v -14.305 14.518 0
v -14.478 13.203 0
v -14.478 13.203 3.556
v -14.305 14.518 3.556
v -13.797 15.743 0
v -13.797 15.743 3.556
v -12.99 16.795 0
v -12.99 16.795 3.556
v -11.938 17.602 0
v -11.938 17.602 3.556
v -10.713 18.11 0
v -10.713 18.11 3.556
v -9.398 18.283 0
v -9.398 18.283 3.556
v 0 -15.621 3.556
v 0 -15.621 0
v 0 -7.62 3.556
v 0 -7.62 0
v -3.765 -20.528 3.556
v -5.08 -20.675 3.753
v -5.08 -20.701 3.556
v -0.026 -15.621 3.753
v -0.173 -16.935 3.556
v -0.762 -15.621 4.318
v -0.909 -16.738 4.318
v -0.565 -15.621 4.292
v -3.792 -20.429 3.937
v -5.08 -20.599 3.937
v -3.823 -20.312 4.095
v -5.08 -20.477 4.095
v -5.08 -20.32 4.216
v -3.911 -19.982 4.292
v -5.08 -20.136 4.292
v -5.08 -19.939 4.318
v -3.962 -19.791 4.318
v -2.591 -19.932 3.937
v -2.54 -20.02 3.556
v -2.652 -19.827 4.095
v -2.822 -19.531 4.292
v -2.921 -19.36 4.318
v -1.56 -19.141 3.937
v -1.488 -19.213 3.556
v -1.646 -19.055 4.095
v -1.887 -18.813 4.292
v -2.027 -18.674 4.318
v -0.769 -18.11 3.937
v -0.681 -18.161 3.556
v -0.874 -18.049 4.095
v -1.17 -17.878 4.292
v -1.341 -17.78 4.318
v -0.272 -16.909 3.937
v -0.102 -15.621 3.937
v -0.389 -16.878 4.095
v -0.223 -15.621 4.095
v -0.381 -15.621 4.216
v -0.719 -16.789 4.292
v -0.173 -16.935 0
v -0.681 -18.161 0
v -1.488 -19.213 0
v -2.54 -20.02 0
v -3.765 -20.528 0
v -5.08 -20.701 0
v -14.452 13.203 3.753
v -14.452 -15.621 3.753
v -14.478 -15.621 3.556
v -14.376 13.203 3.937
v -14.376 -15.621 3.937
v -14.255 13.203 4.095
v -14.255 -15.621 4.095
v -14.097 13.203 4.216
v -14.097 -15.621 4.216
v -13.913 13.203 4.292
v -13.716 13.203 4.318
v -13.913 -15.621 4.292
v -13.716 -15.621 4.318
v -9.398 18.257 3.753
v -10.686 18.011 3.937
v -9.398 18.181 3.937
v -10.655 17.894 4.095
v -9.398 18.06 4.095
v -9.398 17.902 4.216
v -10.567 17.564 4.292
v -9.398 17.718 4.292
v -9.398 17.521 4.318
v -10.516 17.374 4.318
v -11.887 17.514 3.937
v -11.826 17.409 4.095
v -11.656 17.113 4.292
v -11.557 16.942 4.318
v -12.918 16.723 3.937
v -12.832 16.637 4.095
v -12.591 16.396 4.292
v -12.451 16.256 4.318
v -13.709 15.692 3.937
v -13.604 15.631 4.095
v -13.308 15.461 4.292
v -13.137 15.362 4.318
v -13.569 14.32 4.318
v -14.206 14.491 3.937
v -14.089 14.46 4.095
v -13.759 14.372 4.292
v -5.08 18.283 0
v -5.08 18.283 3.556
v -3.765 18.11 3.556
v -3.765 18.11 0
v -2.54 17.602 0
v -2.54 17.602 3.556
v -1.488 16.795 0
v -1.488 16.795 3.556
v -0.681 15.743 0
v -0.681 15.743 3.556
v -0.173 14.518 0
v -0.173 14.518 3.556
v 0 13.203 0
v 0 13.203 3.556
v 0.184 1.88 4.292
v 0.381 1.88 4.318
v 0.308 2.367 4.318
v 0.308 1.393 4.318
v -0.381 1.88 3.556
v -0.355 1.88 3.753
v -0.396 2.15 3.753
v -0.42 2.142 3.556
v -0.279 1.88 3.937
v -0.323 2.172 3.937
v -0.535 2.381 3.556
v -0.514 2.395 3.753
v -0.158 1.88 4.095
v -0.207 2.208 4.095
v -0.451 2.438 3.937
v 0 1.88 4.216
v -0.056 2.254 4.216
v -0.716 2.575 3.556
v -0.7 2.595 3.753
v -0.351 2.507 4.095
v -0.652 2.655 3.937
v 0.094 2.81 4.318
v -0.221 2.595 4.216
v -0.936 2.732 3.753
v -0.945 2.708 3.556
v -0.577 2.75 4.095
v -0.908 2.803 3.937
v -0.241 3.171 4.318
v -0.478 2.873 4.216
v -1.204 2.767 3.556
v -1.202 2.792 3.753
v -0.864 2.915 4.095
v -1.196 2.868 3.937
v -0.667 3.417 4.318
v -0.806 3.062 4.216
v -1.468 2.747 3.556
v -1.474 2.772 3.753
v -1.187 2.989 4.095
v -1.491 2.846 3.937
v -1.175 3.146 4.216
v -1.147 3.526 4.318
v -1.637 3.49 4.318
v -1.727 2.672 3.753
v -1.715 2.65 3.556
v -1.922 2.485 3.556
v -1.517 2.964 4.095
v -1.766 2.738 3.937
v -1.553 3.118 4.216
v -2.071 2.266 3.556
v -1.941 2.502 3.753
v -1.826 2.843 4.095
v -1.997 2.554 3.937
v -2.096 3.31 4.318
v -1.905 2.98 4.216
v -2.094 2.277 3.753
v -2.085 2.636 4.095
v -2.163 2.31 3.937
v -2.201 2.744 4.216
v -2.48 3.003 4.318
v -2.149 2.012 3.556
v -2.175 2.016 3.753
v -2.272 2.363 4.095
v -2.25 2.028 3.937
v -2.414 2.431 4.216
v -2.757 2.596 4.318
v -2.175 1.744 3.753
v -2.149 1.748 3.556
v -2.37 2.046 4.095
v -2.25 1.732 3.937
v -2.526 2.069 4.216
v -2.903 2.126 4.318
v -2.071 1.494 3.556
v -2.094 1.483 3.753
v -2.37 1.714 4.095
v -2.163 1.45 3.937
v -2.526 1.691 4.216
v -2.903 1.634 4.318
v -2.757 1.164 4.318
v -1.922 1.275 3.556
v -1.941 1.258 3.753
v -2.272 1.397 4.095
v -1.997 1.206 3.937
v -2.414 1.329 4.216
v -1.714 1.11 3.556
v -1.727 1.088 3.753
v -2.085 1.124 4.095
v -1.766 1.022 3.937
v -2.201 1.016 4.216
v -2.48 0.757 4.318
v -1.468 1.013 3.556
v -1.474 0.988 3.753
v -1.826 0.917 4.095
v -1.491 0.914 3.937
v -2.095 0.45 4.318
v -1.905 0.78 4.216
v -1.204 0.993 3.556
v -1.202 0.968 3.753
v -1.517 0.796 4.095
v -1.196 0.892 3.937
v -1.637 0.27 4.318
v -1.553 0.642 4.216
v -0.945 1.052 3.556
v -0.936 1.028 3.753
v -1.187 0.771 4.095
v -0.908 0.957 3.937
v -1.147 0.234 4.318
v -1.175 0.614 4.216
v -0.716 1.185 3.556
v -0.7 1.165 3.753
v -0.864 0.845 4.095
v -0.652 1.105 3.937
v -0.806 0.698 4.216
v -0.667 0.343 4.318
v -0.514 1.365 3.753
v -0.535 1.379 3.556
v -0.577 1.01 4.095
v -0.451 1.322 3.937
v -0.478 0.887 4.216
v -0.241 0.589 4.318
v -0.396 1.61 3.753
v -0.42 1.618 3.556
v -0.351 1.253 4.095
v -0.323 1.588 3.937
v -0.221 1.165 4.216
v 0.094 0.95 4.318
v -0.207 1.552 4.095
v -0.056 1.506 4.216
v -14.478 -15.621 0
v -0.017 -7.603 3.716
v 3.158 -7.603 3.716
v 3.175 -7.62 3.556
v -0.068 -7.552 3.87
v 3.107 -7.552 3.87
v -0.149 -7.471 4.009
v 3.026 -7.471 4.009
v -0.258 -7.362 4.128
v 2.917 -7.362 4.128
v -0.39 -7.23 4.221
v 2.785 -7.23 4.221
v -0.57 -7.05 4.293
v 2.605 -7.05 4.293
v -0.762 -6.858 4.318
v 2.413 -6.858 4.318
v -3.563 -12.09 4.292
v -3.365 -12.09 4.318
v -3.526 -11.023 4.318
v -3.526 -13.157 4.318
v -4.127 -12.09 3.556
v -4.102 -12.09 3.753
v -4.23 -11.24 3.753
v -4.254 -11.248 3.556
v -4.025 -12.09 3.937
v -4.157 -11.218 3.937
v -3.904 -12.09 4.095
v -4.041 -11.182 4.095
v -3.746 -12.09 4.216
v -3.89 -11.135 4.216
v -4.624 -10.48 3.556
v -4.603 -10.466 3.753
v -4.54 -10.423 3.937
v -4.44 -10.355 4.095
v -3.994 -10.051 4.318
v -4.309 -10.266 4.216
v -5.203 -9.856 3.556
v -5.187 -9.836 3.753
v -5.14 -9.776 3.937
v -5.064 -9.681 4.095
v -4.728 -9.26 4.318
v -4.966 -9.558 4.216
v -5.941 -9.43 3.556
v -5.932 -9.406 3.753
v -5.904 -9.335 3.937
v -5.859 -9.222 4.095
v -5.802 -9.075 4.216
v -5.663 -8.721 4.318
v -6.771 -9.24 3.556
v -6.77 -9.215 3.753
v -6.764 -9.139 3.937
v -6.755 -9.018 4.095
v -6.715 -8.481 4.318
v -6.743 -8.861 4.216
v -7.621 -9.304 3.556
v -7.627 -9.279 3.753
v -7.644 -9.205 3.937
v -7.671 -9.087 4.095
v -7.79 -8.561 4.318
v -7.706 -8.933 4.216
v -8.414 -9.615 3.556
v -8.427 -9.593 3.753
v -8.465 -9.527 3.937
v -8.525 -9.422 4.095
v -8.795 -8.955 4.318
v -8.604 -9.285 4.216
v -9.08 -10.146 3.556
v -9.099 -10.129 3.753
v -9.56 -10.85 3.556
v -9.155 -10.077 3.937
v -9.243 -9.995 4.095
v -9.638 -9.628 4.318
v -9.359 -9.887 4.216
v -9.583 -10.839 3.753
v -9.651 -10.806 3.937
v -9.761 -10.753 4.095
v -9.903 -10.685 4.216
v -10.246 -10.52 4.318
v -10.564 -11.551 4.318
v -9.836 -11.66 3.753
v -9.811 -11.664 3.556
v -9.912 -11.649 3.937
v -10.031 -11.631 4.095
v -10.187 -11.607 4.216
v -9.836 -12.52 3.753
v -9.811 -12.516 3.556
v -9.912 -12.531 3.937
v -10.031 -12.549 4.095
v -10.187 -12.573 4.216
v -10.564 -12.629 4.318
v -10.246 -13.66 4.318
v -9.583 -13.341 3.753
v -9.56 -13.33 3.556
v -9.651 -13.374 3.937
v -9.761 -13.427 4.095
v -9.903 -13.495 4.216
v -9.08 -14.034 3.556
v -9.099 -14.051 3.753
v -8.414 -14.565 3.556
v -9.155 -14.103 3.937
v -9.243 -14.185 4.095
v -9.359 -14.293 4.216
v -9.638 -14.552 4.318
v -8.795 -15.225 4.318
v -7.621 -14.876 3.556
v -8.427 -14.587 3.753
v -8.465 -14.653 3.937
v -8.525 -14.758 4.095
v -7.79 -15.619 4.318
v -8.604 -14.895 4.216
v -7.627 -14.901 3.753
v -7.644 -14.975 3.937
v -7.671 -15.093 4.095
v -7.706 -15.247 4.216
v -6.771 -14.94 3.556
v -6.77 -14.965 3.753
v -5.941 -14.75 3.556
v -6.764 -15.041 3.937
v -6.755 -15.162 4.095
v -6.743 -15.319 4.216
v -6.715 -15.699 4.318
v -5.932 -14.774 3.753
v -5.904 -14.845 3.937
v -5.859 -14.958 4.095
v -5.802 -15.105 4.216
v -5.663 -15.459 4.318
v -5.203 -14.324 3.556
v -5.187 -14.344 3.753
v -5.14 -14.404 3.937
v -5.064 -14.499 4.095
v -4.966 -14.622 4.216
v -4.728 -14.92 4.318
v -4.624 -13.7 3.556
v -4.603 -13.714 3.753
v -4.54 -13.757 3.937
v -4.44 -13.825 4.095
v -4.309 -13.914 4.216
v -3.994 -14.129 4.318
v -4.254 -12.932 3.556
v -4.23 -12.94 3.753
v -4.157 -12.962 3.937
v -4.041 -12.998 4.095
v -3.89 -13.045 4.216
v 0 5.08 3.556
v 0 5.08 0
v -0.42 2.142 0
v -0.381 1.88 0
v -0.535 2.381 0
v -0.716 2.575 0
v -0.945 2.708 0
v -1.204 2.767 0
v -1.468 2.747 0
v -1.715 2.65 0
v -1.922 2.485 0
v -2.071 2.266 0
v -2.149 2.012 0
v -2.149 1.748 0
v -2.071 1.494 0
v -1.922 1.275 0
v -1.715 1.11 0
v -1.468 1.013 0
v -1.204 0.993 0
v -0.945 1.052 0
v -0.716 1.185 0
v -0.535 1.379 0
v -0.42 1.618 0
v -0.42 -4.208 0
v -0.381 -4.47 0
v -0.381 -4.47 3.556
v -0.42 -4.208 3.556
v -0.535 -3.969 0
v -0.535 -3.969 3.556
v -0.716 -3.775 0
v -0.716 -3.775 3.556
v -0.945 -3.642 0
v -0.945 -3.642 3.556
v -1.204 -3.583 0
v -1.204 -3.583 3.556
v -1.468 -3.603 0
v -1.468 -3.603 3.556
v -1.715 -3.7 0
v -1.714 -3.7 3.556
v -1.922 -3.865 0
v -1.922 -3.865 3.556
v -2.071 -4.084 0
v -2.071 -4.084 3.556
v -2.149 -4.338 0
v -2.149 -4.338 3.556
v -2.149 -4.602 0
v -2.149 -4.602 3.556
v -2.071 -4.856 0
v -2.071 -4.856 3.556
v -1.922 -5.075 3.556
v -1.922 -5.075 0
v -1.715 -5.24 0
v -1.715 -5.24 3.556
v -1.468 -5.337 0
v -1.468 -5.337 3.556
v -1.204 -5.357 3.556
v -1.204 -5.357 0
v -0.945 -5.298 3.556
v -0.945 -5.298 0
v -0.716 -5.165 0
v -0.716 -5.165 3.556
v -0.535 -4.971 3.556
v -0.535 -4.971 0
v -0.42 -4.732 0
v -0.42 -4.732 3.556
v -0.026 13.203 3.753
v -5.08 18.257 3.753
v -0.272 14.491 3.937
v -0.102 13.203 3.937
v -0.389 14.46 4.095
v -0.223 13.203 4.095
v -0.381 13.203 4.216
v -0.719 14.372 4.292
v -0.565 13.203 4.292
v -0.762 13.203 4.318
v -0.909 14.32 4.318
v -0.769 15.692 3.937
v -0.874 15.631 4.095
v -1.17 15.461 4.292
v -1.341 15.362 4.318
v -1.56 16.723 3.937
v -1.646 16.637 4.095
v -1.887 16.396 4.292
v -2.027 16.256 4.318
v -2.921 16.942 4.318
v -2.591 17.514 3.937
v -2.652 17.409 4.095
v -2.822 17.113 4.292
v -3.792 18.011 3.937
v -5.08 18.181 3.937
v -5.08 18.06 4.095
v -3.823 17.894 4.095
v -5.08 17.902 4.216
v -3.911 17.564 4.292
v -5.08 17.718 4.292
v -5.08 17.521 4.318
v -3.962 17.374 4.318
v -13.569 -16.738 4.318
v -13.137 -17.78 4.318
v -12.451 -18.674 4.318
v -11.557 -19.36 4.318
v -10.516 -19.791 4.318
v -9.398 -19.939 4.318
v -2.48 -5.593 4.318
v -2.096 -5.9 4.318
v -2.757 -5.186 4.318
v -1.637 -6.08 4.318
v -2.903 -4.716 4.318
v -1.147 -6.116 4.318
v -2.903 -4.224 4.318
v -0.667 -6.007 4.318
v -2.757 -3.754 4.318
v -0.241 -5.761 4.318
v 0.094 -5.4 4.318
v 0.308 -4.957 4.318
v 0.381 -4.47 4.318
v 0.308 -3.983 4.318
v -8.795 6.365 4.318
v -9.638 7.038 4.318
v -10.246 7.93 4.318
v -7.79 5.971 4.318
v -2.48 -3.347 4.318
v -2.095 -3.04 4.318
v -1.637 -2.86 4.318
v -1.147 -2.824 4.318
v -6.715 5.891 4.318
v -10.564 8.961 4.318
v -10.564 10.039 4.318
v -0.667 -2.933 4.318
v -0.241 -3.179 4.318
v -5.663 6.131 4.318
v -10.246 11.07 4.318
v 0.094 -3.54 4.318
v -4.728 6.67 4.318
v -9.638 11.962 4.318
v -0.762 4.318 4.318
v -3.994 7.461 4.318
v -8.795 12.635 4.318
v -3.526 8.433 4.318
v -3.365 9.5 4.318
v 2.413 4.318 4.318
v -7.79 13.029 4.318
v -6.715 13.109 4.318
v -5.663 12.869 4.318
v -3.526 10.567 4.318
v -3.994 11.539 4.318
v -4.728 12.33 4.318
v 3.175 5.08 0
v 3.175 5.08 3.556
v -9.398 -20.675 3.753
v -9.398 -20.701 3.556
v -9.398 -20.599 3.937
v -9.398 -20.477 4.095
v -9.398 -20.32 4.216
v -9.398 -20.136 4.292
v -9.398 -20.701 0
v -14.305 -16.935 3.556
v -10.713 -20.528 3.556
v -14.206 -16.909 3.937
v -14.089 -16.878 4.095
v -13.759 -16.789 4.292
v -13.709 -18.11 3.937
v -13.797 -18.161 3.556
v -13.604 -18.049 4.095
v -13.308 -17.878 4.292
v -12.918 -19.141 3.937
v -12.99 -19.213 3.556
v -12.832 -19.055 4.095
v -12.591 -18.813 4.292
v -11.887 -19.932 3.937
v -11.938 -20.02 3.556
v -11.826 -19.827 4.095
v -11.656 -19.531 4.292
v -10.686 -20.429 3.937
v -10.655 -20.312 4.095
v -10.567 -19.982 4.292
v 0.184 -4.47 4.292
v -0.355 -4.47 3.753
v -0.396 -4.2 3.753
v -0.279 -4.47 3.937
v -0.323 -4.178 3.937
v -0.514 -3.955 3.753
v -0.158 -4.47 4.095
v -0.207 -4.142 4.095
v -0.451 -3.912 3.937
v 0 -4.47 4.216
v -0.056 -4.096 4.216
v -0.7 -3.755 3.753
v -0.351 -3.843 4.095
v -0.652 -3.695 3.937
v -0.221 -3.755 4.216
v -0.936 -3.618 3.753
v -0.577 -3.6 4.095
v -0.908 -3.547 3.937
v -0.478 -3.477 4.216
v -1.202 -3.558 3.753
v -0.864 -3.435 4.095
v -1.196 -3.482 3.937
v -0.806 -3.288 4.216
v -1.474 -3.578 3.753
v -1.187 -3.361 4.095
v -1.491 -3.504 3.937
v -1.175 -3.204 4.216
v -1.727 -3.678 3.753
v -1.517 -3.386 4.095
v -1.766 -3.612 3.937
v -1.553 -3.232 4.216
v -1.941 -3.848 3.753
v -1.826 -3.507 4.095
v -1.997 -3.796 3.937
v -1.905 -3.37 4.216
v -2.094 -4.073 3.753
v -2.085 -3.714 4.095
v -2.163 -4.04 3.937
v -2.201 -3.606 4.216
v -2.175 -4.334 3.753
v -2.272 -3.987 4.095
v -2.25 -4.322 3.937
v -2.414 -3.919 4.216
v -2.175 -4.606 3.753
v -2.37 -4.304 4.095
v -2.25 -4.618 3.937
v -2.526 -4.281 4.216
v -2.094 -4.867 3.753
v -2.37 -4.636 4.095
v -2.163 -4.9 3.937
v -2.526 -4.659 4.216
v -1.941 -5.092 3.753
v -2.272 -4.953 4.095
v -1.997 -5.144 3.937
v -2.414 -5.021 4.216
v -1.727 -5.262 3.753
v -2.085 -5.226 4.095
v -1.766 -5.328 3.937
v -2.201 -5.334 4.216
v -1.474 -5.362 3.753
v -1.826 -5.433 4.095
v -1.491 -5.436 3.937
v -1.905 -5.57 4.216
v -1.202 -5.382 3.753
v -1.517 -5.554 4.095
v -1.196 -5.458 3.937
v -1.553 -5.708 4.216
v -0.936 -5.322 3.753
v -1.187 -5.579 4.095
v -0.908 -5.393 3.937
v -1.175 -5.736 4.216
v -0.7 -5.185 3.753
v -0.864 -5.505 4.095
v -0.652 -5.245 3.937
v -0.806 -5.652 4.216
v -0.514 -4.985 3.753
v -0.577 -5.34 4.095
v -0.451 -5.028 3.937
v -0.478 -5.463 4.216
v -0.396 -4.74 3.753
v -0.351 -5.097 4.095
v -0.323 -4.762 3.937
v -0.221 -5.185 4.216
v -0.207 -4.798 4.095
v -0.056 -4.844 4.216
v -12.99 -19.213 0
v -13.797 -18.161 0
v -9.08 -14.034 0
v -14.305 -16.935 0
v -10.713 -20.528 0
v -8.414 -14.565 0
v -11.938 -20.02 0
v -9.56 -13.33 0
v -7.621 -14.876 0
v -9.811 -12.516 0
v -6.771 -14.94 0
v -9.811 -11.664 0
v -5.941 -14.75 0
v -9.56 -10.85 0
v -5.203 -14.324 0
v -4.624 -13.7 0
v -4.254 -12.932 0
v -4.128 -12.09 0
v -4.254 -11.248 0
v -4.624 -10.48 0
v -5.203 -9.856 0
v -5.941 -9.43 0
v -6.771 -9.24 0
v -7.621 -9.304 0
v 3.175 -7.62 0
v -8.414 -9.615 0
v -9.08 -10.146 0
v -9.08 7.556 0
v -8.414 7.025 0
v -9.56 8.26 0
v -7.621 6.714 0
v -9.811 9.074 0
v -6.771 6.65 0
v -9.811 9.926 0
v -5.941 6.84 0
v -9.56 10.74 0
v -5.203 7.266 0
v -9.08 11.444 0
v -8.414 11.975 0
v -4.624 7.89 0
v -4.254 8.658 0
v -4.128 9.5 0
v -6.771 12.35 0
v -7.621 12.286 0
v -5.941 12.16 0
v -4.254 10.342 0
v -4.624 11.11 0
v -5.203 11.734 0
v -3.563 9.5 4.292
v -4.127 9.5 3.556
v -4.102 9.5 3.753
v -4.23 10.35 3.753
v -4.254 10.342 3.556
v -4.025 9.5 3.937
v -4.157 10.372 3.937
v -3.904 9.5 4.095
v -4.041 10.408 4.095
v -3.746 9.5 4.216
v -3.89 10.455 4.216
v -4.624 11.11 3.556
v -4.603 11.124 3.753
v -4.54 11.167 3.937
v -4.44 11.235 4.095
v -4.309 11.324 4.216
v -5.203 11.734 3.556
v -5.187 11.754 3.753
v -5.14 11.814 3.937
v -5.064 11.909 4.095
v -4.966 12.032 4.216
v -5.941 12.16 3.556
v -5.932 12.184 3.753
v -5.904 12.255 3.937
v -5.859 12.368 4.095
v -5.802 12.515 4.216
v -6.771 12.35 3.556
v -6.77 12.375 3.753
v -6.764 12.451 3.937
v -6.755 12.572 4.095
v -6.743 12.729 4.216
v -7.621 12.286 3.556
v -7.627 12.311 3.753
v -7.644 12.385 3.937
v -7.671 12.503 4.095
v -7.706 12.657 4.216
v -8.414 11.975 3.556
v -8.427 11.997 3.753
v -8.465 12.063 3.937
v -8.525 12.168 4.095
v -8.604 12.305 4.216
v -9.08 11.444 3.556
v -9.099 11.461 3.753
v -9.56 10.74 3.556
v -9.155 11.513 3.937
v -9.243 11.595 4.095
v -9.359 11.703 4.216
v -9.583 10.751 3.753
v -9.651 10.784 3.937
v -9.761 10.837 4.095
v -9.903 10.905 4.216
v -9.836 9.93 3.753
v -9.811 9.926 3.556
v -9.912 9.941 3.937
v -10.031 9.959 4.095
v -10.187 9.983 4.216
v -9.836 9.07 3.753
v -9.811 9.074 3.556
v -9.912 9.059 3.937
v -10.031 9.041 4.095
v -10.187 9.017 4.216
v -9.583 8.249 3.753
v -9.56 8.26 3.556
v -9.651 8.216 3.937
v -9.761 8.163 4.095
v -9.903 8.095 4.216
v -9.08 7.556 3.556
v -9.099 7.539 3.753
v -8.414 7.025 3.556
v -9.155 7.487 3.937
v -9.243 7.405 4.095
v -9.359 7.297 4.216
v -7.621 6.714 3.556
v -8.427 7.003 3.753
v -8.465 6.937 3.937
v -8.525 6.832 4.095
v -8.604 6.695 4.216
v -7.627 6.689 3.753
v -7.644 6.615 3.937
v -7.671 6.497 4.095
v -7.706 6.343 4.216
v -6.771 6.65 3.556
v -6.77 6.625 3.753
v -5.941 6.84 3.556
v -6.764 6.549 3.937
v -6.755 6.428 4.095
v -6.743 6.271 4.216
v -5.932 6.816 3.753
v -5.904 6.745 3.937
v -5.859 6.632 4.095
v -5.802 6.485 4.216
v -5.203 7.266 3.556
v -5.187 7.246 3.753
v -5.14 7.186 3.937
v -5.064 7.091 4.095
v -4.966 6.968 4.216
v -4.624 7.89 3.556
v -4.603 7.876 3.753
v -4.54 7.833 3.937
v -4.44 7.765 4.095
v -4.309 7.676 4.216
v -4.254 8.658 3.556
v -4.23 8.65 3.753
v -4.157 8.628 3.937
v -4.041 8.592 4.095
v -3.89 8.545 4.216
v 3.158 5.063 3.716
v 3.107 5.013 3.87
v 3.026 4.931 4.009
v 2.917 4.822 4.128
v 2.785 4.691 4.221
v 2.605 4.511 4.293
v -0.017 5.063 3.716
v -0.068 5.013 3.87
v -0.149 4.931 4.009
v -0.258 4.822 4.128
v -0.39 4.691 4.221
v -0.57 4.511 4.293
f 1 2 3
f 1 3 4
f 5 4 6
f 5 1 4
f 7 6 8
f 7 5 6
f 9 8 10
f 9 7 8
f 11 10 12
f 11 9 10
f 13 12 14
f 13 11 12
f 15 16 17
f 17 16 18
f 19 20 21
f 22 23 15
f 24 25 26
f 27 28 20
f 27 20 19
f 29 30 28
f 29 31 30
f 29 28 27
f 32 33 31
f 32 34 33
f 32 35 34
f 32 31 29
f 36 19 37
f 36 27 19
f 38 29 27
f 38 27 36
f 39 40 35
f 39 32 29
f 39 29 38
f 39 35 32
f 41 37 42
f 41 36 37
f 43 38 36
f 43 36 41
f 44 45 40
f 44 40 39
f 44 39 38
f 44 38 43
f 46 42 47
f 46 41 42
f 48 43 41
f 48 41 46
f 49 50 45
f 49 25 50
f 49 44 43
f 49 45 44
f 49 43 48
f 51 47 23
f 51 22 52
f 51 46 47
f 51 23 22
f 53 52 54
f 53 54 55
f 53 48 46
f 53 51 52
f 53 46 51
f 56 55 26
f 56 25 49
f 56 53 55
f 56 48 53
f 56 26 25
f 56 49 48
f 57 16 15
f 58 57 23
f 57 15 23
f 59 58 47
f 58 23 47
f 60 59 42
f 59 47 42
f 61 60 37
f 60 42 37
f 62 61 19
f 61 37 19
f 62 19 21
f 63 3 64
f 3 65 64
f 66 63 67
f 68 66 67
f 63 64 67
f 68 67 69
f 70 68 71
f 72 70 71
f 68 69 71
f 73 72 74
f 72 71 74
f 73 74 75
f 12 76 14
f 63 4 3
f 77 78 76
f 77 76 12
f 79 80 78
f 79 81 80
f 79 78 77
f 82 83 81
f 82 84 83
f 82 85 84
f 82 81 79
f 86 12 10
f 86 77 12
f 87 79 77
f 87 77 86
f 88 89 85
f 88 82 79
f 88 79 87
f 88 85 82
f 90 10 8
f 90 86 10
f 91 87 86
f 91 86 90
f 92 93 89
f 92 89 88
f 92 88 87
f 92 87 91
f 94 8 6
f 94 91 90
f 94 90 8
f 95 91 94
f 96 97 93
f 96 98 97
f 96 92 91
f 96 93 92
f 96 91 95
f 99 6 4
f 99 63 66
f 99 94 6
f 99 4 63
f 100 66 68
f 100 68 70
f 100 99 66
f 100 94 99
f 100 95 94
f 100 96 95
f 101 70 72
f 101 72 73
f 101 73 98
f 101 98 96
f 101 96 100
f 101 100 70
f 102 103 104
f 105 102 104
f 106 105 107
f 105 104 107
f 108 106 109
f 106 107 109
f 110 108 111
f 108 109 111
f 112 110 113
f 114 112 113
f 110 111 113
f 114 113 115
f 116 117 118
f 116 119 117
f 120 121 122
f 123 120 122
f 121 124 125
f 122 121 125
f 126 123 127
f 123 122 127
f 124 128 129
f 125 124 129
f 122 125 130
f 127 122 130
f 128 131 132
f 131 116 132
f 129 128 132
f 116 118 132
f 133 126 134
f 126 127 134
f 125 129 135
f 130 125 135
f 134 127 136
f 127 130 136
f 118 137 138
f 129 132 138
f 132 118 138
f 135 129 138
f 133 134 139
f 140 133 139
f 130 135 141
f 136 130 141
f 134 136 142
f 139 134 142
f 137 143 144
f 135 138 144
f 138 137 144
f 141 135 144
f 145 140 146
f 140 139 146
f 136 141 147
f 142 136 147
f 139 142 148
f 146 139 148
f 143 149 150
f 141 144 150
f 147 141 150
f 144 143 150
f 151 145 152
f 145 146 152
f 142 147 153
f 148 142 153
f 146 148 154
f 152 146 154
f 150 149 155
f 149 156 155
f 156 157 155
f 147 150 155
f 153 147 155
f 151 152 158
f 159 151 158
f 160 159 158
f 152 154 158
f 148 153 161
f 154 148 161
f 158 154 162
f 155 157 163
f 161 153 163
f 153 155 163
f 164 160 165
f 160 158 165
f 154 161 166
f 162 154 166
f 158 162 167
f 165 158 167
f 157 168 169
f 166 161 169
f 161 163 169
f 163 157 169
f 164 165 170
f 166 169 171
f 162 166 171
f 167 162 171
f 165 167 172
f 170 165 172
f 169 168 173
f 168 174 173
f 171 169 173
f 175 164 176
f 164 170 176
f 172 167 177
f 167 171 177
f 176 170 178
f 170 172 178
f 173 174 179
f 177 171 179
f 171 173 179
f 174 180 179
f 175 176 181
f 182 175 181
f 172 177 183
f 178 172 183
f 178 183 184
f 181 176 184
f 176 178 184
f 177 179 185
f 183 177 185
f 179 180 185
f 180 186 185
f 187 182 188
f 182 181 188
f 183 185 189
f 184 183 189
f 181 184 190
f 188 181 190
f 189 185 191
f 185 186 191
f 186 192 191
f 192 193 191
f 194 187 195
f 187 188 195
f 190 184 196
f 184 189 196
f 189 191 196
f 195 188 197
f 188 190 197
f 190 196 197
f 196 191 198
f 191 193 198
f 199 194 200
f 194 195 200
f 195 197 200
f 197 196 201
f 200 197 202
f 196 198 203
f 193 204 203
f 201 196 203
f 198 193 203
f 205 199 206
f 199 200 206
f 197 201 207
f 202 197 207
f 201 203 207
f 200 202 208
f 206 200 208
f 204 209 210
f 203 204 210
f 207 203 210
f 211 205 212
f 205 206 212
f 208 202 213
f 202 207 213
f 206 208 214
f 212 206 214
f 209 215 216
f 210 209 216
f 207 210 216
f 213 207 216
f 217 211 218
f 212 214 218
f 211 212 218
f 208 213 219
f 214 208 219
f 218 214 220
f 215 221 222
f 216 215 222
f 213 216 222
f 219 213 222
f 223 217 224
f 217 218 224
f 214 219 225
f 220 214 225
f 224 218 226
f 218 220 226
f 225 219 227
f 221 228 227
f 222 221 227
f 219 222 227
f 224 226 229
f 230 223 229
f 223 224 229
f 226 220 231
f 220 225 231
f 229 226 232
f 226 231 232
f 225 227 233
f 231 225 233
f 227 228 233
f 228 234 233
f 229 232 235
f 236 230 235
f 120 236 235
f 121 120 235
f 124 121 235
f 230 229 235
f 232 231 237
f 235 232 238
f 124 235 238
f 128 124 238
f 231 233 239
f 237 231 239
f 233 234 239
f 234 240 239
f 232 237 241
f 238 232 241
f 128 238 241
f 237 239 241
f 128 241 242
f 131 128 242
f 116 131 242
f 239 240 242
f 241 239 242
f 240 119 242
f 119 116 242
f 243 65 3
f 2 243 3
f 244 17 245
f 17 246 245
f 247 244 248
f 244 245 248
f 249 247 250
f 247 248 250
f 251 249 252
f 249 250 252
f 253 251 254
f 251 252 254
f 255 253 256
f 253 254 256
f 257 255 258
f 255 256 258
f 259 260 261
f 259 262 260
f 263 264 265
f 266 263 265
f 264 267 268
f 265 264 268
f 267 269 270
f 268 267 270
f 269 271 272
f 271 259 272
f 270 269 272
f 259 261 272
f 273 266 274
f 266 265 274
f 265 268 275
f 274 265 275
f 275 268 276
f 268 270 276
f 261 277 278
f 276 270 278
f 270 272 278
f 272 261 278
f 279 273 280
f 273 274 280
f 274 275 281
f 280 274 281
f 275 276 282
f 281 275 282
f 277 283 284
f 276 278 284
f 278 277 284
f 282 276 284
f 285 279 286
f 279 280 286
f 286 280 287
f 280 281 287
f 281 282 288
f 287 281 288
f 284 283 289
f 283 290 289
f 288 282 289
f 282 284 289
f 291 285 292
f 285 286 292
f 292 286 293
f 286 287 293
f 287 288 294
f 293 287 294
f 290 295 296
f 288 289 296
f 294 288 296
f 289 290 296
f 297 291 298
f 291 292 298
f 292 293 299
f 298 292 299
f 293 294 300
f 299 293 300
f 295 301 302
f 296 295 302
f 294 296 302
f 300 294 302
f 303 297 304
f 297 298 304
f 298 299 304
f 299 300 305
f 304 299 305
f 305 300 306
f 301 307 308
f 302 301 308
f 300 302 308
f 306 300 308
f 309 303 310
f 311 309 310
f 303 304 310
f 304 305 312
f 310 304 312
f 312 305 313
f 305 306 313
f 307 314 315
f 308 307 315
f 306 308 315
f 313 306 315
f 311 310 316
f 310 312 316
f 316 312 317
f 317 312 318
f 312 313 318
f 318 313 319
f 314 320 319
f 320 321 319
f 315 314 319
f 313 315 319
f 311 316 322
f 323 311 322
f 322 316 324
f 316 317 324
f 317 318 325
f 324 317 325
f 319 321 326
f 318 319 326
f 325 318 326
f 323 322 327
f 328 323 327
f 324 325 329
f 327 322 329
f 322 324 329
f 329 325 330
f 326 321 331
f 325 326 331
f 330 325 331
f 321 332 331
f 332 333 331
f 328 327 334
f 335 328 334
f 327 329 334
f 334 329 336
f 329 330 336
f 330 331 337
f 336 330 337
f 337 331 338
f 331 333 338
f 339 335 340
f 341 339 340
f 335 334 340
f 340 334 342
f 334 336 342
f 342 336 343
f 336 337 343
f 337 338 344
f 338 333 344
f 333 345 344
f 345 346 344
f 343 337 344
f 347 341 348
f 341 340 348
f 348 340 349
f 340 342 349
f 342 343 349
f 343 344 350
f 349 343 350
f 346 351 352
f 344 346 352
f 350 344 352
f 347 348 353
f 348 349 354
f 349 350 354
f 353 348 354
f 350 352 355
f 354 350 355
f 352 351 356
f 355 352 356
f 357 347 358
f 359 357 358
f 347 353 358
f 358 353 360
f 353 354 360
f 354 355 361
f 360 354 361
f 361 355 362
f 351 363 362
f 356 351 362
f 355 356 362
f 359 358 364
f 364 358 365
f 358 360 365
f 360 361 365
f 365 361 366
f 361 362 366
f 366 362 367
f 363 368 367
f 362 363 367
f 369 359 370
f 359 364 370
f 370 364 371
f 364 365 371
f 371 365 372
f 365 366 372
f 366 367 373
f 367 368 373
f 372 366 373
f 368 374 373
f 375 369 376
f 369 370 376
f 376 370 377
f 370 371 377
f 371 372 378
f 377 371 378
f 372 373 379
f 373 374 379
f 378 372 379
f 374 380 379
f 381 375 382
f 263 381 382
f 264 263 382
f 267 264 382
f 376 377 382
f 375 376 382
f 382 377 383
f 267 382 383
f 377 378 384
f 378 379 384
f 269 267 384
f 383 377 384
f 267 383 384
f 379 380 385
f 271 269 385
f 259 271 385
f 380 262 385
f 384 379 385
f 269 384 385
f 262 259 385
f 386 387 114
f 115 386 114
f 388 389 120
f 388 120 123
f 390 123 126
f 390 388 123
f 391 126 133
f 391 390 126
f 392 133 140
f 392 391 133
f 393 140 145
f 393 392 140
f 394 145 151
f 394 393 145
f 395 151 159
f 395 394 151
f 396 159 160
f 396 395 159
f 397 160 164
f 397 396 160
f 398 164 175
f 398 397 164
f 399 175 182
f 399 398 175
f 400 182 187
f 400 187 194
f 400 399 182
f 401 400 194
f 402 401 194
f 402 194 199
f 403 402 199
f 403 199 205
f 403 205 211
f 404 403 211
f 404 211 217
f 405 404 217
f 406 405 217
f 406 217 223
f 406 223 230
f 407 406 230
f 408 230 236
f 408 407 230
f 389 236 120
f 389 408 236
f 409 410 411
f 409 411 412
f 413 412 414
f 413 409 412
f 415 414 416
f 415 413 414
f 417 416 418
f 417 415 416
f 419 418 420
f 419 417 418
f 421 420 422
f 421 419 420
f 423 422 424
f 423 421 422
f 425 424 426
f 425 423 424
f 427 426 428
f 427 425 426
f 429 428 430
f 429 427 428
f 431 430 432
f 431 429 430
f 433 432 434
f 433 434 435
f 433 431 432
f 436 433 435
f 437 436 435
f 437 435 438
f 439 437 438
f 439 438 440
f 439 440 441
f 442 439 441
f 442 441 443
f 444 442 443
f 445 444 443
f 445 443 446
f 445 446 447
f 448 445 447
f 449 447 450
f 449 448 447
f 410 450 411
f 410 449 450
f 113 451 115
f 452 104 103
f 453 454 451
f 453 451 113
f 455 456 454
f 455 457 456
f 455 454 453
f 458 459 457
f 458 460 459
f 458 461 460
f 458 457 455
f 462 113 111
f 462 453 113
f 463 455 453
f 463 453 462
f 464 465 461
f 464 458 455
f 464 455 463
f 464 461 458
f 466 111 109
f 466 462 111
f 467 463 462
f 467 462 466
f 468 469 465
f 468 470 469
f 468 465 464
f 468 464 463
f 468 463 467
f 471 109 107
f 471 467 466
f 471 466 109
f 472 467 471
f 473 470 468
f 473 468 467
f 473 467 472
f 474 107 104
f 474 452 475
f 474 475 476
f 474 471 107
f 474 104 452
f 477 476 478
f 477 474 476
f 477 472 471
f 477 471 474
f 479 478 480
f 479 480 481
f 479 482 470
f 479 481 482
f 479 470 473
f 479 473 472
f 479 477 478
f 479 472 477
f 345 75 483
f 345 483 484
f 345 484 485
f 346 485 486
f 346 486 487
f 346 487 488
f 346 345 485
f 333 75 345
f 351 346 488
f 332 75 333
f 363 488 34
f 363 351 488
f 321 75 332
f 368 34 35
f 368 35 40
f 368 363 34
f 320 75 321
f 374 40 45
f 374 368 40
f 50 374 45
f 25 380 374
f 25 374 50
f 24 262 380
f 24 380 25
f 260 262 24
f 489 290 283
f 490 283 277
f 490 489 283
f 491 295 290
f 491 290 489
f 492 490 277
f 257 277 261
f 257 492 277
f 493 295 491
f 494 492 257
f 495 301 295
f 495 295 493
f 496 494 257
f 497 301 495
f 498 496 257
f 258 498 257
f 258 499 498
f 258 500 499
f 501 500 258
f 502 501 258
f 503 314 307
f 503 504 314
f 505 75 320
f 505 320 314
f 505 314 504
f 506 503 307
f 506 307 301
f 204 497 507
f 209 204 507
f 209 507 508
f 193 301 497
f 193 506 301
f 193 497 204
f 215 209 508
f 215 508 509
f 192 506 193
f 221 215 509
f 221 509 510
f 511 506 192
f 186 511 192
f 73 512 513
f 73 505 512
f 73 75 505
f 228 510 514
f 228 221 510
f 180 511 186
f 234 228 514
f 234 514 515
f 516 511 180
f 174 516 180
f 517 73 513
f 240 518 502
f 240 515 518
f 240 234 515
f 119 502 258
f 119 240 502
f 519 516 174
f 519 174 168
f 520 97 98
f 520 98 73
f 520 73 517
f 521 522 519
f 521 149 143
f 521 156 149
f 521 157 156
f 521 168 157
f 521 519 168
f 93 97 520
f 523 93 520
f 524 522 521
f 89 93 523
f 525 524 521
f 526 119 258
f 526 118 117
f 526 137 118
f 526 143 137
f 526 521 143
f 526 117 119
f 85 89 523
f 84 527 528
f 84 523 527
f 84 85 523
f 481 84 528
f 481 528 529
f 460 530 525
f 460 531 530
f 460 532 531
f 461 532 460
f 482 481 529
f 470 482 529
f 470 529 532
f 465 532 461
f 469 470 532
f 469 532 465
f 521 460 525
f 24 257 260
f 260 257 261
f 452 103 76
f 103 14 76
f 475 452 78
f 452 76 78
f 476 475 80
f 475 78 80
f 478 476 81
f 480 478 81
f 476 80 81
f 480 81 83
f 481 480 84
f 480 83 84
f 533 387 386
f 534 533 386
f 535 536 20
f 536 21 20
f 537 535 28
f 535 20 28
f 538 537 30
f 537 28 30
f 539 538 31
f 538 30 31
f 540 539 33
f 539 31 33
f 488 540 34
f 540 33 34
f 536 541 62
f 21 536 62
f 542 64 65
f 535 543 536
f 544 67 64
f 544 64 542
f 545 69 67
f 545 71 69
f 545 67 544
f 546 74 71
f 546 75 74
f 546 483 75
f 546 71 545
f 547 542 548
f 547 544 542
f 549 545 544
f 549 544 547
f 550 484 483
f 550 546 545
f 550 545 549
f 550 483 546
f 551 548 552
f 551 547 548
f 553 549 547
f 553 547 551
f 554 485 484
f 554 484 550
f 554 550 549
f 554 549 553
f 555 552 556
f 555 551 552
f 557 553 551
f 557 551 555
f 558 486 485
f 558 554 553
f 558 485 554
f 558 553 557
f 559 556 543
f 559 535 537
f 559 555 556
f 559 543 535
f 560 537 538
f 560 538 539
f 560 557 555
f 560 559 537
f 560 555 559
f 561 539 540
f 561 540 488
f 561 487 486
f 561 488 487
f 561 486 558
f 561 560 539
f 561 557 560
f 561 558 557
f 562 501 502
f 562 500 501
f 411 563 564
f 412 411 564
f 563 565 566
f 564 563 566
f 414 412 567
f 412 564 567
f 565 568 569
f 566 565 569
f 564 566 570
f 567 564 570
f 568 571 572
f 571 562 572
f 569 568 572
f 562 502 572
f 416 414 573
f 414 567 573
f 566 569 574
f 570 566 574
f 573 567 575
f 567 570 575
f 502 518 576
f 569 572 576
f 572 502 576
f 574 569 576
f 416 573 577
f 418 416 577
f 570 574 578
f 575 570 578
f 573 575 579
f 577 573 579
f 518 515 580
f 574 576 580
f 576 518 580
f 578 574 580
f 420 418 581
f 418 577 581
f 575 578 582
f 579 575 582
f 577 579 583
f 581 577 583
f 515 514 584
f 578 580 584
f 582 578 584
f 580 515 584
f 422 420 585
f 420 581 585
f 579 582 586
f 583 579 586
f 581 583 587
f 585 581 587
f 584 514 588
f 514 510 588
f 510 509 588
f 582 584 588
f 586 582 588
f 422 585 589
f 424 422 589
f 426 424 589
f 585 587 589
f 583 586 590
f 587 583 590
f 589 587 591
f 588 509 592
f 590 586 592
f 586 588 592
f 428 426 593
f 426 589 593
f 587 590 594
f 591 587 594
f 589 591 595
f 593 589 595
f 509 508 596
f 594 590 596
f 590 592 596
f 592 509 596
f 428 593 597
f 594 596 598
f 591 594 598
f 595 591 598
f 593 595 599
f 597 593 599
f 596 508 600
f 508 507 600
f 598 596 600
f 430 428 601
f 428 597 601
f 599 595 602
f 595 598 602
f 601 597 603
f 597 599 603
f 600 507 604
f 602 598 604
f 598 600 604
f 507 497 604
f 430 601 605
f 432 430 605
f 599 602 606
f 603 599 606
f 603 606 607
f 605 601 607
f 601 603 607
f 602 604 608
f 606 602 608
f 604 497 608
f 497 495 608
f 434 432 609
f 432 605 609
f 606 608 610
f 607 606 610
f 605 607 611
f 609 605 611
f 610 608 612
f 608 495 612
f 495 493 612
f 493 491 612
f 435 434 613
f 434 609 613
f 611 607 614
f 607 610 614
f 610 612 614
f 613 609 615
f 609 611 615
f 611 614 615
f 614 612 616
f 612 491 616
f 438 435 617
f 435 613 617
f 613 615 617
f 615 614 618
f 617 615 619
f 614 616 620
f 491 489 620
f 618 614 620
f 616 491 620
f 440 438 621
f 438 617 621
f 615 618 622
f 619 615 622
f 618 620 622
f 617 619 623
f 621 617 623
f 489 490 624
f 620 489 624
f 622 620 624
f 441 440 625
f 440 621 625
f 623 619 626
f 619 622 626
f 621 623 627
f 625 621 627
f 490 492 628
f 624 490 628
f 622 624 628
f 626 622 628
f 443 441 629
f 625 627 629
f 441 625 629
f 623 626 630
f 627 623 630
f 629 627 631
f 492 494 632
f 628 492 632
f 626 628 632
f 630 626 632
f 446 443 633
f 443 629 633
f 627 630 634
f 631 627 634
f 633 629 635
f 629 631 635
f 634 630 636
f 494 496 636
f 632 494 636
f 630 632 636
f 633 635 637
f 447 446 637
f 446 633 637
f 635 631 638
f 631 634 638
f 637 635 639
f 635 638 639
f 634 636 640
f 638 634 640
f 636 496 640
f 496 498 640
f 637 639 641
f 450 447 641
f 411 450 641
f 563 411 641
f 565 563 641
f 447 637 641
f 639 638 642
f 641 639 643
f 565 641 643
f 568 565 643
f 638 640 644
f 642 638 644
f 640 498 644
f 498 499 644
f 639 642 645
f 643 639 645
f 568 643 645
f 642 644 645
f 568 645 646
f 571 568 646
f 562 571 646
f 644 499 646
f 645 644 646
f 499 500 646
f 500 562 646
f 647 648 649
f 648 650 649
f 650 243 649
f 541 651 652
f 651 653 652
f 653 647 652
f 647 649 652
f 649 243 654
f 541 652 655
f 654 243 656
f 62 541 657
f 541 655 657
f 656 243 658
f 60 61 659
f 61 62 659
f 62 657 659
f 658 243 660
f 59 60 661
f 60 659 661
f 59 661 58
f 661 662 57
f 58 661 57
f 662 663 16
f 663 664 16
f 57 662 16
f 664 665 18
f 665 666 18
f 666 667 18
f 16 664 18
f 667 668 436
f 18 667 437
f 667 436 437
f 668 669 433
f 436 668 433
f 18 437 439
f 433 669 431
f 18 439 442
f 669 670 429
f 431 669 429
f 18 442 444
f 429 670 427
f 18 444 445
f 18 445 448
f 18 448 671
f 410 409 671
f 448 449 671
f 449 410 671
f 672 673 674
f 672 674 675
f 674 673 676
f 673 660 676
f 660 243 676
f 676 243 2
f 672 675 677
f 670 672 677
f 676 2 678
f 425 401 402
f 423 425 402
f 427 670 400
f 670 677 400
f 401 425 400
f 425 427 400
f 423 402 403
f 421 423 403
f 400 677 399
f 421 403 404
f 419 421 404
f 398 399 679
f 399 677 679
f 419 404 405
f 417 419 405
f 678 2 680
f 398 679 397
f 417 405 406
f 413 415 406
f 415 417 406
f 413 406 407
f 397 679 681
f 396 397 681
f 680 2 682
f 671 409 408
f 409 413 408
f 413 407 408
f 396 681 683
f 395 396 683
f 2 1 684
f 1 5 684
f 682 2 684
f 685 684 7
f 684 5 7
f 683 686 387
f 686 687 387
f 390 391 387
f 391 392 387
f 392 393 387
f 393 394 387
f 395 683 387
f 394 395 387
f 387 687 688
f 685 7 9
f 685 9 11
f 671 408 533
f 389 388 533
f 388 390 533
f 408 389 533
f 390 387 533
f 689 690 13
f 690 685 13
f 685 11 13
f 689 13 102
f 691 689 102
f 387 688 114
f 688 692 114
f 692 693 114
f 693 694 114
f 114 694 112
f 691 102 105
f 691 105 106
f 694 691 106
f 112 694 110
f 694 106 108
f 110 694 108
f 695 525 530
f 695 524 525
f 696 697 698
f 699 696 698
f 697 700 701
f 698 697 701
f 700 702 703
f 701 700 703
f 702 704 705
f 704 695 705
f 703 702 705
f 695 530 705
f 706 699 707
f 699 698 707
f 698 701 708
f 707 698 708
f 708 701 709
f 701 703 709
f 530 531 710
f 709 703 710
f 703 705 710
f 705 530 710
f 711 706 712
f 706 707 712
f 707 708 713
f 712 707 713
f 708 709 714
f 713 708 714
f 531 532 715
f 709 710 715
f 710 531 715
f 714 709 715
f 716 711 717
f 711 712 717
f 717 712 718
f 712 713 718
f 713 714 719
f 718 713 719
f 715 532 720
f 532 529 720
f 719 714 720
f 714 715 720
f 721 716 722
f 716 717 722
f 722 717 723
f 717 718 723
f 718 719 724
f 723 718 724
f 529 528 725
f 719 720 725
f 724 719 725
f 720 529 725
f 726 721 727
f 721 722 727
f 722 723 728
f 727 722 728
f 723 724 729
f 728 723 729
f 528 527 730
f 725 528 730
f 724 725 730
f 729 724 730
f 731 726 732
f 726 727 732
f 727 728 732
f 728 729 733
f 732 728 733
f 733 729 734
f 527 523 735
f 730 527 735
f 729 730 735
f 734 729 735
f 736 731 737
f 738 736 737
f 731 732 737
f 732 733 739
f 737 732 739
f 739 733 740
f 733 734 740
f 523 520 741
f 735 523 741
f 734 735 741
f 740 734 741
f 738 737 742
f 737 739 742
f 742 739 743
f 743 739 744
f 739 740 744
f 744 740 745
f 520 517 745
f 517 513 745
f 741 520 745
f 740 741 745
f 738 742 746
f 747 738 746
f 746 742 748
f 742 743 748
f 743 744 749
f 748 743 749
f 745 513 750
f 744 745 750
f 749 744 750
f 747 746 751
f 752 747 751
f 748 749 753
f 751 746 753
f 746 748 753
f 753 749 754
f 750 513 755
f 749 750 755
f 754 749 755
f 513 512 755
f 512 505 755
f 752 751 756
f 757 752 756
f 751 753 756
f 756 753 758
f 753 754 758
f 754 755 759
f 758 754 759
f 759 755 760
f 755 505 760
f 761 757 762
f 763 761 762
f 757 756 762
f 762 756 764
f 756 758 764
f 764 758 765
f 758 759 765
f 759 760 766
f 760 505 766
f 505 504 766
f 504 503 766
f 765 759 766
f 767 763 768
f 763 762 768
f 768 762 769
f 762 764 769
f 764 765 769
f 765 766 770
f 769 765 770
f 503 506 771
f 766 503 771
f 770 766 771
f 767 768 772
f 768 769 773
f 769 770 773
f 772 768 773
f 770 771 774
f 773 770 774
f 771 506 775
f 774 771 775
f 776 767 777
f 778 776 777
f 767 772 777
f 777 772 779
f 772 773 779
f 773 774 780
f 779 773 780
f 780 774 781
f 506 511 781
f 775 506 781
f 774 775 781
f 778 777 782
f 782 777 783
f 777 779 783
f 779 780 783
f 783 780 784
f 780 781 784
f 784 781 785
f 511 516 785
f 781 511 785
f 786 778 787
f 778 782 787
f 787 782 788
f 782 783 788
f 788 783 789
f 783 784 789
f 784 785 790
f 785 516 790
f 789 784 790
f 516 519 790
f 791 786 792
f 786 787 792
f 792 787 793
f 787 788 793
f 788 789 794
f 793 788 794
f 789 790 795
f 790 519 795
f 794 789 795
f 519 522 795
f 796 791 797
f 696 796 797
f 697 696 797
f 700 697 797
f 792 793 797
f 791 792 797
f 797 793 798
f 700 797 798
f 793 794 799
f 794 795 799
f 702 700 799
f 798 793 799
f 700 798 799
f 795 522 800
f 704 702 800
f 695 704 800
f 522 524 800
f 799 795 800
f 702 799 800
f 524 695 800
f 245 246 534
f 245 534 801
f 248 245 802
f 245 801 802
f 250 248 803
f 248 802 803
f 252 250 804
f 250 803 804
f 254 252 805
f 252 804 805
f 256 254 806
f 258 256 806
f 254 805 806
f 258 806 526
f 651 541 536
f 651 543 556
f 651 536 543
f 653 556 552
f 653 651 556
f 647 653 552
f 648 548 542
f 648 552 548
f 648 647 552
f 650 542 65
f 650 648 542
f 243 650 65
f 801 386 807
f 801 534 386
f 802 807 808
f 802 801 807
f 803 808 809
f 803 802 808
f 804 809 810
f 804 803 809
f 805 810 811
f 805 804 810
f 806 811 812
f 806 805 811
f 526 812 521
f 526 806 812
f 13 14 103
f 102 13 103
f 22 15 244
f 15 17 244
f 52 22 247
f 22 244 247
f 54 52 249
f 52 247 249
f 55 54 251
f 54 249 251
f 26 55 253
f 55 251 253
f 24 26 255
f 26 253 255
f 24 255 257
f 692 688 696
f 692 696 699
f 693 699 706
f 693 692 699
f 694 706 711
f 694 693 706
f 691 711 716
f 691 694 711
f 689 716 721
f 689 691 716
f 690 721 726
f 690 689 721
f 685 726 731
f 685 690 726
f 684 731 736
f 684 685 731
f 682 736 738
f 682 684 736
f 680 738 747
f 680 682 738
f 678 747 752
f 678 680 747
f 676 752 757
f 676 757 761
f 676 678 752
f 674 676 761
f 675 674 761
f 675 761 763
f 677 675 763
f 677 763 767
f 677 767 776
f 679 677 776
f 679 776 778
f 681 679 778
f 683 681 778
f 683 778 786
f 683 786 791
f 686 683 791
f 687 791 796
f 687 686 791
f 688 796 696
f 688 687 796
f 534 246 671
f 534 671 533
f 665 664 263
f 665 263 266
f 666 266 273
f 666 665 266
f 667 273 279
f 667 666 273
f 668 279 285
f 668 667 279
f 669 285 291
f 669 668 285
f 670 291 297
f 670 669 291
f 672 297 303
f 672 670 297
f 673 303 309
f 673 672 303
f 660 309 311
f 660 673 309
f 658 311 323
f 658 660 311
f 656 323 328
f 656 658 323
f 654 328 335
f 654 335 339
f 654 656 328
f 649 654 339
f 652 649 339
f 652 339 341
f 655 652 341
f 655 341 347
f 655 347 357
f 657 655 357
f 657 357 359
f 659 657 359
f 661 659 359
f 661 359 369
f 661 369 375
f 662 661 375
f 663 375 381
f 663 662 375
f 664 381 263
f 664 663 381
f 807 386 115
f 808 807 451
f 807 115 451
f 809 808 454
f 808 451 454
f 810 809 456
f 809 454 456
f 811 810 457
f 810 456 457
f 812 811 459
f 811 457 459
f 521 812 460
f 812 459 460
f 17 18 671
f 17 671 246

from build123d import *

# Parameters (mm, degrees)
F0_R     = 2.8575
F0_R_2   = 0.889
F0_R_3   = 1.905
F0_R_4   = 11.7475
F1_DEPTH = 4.318
F2_W     = 12.7
F2_H     = 4.318
F3_DEPTH = 3.175
F4_R     = 5.08
F6_DEPTH = 25.4
F7_R     = 5.08
F8_R     = 0.762


# Not quite as in the source:
# - a feature names something its author has since deleted; it is built from what else it names


with BuildPart() as f1:
    # F0 (on Top) → F1 (new body)
    with BuildSketch(Plane.XY):
        Polygon((0, -20.7006), (0, 0), (0, 63.5), (-41.91, 63.5), (-41.91, 19), (-41.91, 0), (-41.91, -20.7006), align=None)
        with Locations((-34.925, -12.09)):
            Circle(F0_R, mode=Mode.SUBTRACT)
        with Locations((-34.925, 9.5)):
            Circle(F0_R, mode=Mode.SUBTRACT)
        with Locations((-6.985, -12.09)):
            Circle(F0_R, mode=Mode.SUBTRACT)
        with Locations((-1.27, -4.47)):
            Circle(F0_R_2, mode=Mode.SUBTRACT)
        with Locations((-6.985, 9.5)):
            Circle(F0_R, mode=Mode.SUBTRACT)
        with Locations((-1.27, 1.88)):
            Circle(F0_R_2, mode=Mode.SUBTRACT)
        with Locations((-36.83, 27.178)):
            Circle(F0_R_3, mode=Mode.SUBTRACT)
        with Locations((-36.83, 58.293)):
            Circle(F0_R_3, mode=Mode.SUBTRACT)
        with Locations((-5.08, 27.178)):
            Circle(F0_R_3, mode=Mode.SUBTRACT)
        with Locations((-20.955, 42.7355)):
            Circle(F0_R_4, mode=Mode.SUBTRACT)
        with Locations((-5.08, 58.293)):
            Circle(F0_R_3, mode=Mode.SUBTRACT)
    extrude(amount=F1_DEPTH)

    # F2 (on face) → F3 (join)
    with BuildSketch(Plane.YZ):
        with Locations((-1.2696, 2.159)):
            Rectangle(F2_W, F2_H)
    extrude(amount=F3_DEPTH)

    # F4
    f4_edges = [f1.edges().sort_by_distance(p)[0] for p in [
        (0, 63.5, 2.159),
        (-41.91, 63.5, 2.159),
        (0, -20.7006, 2.159),
        (-41.91, -20.7006, 2.159),
    ]]
    fillet(f4_edges, radius=F4_R)

    # F5 (on face) → F6 (cut)
    with BuildSketch(Plane.XY.offset(4.318)):
        Polygon((-51.067360534, -23.478101939), (-14.478, -25.962697342), (-14.478, 18.2829182773), (4.9410860353, 18.2829182773), (4.9410860353, 69.2363290038), (-51.067360534, 69.2363290038), align=None)
    extrude(amount=-F6_DEPTH, mode=Mode.SUBTRACT)

    # F7
    f7_edges = [f1.edges().sort_by_distance(p)[0] for p in [
        (-14.478, -20.7006, 2.159),
        (-14.478, 18.282918, 2.159),
        (0, 18.282918, 2.159),
    ]]
    fillet(f7_edges, radius=F7_R)

    # F8
    f8_edges = [f1.edges().sort_by_distance(p)[0] for p in [
        (0, 9.141659, 4.318),
        (-1.487898, 16.795021, 4.318),
        (1.5875, 5.0804, 4.318),
        (-7.239, 18.282918, 4.318),
        (3.175, -1.2696, 4.318),
        (-12.990102, 16.795021, 4.318),
        (1.5875, -7.6196, 4.318),
        (-14.478, -1.208841, 4.318),
        (0, -11.6201, 4.318),
        (-12.990102, -19.212702, 4.318),
        (-1.487898, -19.212702, 4.318),
        (-7.239, -20.7006, 4.318),
        (-9.8425, -12.09, 4.318),
        (-2.159, -4.47, 4.318),
        (-2.159, 1.88, 4.318),
        (-9.8425, 9.5, 4.318),
    ]]
    fillet(f8_edges, radius=F8_R)


solid = f1.part
